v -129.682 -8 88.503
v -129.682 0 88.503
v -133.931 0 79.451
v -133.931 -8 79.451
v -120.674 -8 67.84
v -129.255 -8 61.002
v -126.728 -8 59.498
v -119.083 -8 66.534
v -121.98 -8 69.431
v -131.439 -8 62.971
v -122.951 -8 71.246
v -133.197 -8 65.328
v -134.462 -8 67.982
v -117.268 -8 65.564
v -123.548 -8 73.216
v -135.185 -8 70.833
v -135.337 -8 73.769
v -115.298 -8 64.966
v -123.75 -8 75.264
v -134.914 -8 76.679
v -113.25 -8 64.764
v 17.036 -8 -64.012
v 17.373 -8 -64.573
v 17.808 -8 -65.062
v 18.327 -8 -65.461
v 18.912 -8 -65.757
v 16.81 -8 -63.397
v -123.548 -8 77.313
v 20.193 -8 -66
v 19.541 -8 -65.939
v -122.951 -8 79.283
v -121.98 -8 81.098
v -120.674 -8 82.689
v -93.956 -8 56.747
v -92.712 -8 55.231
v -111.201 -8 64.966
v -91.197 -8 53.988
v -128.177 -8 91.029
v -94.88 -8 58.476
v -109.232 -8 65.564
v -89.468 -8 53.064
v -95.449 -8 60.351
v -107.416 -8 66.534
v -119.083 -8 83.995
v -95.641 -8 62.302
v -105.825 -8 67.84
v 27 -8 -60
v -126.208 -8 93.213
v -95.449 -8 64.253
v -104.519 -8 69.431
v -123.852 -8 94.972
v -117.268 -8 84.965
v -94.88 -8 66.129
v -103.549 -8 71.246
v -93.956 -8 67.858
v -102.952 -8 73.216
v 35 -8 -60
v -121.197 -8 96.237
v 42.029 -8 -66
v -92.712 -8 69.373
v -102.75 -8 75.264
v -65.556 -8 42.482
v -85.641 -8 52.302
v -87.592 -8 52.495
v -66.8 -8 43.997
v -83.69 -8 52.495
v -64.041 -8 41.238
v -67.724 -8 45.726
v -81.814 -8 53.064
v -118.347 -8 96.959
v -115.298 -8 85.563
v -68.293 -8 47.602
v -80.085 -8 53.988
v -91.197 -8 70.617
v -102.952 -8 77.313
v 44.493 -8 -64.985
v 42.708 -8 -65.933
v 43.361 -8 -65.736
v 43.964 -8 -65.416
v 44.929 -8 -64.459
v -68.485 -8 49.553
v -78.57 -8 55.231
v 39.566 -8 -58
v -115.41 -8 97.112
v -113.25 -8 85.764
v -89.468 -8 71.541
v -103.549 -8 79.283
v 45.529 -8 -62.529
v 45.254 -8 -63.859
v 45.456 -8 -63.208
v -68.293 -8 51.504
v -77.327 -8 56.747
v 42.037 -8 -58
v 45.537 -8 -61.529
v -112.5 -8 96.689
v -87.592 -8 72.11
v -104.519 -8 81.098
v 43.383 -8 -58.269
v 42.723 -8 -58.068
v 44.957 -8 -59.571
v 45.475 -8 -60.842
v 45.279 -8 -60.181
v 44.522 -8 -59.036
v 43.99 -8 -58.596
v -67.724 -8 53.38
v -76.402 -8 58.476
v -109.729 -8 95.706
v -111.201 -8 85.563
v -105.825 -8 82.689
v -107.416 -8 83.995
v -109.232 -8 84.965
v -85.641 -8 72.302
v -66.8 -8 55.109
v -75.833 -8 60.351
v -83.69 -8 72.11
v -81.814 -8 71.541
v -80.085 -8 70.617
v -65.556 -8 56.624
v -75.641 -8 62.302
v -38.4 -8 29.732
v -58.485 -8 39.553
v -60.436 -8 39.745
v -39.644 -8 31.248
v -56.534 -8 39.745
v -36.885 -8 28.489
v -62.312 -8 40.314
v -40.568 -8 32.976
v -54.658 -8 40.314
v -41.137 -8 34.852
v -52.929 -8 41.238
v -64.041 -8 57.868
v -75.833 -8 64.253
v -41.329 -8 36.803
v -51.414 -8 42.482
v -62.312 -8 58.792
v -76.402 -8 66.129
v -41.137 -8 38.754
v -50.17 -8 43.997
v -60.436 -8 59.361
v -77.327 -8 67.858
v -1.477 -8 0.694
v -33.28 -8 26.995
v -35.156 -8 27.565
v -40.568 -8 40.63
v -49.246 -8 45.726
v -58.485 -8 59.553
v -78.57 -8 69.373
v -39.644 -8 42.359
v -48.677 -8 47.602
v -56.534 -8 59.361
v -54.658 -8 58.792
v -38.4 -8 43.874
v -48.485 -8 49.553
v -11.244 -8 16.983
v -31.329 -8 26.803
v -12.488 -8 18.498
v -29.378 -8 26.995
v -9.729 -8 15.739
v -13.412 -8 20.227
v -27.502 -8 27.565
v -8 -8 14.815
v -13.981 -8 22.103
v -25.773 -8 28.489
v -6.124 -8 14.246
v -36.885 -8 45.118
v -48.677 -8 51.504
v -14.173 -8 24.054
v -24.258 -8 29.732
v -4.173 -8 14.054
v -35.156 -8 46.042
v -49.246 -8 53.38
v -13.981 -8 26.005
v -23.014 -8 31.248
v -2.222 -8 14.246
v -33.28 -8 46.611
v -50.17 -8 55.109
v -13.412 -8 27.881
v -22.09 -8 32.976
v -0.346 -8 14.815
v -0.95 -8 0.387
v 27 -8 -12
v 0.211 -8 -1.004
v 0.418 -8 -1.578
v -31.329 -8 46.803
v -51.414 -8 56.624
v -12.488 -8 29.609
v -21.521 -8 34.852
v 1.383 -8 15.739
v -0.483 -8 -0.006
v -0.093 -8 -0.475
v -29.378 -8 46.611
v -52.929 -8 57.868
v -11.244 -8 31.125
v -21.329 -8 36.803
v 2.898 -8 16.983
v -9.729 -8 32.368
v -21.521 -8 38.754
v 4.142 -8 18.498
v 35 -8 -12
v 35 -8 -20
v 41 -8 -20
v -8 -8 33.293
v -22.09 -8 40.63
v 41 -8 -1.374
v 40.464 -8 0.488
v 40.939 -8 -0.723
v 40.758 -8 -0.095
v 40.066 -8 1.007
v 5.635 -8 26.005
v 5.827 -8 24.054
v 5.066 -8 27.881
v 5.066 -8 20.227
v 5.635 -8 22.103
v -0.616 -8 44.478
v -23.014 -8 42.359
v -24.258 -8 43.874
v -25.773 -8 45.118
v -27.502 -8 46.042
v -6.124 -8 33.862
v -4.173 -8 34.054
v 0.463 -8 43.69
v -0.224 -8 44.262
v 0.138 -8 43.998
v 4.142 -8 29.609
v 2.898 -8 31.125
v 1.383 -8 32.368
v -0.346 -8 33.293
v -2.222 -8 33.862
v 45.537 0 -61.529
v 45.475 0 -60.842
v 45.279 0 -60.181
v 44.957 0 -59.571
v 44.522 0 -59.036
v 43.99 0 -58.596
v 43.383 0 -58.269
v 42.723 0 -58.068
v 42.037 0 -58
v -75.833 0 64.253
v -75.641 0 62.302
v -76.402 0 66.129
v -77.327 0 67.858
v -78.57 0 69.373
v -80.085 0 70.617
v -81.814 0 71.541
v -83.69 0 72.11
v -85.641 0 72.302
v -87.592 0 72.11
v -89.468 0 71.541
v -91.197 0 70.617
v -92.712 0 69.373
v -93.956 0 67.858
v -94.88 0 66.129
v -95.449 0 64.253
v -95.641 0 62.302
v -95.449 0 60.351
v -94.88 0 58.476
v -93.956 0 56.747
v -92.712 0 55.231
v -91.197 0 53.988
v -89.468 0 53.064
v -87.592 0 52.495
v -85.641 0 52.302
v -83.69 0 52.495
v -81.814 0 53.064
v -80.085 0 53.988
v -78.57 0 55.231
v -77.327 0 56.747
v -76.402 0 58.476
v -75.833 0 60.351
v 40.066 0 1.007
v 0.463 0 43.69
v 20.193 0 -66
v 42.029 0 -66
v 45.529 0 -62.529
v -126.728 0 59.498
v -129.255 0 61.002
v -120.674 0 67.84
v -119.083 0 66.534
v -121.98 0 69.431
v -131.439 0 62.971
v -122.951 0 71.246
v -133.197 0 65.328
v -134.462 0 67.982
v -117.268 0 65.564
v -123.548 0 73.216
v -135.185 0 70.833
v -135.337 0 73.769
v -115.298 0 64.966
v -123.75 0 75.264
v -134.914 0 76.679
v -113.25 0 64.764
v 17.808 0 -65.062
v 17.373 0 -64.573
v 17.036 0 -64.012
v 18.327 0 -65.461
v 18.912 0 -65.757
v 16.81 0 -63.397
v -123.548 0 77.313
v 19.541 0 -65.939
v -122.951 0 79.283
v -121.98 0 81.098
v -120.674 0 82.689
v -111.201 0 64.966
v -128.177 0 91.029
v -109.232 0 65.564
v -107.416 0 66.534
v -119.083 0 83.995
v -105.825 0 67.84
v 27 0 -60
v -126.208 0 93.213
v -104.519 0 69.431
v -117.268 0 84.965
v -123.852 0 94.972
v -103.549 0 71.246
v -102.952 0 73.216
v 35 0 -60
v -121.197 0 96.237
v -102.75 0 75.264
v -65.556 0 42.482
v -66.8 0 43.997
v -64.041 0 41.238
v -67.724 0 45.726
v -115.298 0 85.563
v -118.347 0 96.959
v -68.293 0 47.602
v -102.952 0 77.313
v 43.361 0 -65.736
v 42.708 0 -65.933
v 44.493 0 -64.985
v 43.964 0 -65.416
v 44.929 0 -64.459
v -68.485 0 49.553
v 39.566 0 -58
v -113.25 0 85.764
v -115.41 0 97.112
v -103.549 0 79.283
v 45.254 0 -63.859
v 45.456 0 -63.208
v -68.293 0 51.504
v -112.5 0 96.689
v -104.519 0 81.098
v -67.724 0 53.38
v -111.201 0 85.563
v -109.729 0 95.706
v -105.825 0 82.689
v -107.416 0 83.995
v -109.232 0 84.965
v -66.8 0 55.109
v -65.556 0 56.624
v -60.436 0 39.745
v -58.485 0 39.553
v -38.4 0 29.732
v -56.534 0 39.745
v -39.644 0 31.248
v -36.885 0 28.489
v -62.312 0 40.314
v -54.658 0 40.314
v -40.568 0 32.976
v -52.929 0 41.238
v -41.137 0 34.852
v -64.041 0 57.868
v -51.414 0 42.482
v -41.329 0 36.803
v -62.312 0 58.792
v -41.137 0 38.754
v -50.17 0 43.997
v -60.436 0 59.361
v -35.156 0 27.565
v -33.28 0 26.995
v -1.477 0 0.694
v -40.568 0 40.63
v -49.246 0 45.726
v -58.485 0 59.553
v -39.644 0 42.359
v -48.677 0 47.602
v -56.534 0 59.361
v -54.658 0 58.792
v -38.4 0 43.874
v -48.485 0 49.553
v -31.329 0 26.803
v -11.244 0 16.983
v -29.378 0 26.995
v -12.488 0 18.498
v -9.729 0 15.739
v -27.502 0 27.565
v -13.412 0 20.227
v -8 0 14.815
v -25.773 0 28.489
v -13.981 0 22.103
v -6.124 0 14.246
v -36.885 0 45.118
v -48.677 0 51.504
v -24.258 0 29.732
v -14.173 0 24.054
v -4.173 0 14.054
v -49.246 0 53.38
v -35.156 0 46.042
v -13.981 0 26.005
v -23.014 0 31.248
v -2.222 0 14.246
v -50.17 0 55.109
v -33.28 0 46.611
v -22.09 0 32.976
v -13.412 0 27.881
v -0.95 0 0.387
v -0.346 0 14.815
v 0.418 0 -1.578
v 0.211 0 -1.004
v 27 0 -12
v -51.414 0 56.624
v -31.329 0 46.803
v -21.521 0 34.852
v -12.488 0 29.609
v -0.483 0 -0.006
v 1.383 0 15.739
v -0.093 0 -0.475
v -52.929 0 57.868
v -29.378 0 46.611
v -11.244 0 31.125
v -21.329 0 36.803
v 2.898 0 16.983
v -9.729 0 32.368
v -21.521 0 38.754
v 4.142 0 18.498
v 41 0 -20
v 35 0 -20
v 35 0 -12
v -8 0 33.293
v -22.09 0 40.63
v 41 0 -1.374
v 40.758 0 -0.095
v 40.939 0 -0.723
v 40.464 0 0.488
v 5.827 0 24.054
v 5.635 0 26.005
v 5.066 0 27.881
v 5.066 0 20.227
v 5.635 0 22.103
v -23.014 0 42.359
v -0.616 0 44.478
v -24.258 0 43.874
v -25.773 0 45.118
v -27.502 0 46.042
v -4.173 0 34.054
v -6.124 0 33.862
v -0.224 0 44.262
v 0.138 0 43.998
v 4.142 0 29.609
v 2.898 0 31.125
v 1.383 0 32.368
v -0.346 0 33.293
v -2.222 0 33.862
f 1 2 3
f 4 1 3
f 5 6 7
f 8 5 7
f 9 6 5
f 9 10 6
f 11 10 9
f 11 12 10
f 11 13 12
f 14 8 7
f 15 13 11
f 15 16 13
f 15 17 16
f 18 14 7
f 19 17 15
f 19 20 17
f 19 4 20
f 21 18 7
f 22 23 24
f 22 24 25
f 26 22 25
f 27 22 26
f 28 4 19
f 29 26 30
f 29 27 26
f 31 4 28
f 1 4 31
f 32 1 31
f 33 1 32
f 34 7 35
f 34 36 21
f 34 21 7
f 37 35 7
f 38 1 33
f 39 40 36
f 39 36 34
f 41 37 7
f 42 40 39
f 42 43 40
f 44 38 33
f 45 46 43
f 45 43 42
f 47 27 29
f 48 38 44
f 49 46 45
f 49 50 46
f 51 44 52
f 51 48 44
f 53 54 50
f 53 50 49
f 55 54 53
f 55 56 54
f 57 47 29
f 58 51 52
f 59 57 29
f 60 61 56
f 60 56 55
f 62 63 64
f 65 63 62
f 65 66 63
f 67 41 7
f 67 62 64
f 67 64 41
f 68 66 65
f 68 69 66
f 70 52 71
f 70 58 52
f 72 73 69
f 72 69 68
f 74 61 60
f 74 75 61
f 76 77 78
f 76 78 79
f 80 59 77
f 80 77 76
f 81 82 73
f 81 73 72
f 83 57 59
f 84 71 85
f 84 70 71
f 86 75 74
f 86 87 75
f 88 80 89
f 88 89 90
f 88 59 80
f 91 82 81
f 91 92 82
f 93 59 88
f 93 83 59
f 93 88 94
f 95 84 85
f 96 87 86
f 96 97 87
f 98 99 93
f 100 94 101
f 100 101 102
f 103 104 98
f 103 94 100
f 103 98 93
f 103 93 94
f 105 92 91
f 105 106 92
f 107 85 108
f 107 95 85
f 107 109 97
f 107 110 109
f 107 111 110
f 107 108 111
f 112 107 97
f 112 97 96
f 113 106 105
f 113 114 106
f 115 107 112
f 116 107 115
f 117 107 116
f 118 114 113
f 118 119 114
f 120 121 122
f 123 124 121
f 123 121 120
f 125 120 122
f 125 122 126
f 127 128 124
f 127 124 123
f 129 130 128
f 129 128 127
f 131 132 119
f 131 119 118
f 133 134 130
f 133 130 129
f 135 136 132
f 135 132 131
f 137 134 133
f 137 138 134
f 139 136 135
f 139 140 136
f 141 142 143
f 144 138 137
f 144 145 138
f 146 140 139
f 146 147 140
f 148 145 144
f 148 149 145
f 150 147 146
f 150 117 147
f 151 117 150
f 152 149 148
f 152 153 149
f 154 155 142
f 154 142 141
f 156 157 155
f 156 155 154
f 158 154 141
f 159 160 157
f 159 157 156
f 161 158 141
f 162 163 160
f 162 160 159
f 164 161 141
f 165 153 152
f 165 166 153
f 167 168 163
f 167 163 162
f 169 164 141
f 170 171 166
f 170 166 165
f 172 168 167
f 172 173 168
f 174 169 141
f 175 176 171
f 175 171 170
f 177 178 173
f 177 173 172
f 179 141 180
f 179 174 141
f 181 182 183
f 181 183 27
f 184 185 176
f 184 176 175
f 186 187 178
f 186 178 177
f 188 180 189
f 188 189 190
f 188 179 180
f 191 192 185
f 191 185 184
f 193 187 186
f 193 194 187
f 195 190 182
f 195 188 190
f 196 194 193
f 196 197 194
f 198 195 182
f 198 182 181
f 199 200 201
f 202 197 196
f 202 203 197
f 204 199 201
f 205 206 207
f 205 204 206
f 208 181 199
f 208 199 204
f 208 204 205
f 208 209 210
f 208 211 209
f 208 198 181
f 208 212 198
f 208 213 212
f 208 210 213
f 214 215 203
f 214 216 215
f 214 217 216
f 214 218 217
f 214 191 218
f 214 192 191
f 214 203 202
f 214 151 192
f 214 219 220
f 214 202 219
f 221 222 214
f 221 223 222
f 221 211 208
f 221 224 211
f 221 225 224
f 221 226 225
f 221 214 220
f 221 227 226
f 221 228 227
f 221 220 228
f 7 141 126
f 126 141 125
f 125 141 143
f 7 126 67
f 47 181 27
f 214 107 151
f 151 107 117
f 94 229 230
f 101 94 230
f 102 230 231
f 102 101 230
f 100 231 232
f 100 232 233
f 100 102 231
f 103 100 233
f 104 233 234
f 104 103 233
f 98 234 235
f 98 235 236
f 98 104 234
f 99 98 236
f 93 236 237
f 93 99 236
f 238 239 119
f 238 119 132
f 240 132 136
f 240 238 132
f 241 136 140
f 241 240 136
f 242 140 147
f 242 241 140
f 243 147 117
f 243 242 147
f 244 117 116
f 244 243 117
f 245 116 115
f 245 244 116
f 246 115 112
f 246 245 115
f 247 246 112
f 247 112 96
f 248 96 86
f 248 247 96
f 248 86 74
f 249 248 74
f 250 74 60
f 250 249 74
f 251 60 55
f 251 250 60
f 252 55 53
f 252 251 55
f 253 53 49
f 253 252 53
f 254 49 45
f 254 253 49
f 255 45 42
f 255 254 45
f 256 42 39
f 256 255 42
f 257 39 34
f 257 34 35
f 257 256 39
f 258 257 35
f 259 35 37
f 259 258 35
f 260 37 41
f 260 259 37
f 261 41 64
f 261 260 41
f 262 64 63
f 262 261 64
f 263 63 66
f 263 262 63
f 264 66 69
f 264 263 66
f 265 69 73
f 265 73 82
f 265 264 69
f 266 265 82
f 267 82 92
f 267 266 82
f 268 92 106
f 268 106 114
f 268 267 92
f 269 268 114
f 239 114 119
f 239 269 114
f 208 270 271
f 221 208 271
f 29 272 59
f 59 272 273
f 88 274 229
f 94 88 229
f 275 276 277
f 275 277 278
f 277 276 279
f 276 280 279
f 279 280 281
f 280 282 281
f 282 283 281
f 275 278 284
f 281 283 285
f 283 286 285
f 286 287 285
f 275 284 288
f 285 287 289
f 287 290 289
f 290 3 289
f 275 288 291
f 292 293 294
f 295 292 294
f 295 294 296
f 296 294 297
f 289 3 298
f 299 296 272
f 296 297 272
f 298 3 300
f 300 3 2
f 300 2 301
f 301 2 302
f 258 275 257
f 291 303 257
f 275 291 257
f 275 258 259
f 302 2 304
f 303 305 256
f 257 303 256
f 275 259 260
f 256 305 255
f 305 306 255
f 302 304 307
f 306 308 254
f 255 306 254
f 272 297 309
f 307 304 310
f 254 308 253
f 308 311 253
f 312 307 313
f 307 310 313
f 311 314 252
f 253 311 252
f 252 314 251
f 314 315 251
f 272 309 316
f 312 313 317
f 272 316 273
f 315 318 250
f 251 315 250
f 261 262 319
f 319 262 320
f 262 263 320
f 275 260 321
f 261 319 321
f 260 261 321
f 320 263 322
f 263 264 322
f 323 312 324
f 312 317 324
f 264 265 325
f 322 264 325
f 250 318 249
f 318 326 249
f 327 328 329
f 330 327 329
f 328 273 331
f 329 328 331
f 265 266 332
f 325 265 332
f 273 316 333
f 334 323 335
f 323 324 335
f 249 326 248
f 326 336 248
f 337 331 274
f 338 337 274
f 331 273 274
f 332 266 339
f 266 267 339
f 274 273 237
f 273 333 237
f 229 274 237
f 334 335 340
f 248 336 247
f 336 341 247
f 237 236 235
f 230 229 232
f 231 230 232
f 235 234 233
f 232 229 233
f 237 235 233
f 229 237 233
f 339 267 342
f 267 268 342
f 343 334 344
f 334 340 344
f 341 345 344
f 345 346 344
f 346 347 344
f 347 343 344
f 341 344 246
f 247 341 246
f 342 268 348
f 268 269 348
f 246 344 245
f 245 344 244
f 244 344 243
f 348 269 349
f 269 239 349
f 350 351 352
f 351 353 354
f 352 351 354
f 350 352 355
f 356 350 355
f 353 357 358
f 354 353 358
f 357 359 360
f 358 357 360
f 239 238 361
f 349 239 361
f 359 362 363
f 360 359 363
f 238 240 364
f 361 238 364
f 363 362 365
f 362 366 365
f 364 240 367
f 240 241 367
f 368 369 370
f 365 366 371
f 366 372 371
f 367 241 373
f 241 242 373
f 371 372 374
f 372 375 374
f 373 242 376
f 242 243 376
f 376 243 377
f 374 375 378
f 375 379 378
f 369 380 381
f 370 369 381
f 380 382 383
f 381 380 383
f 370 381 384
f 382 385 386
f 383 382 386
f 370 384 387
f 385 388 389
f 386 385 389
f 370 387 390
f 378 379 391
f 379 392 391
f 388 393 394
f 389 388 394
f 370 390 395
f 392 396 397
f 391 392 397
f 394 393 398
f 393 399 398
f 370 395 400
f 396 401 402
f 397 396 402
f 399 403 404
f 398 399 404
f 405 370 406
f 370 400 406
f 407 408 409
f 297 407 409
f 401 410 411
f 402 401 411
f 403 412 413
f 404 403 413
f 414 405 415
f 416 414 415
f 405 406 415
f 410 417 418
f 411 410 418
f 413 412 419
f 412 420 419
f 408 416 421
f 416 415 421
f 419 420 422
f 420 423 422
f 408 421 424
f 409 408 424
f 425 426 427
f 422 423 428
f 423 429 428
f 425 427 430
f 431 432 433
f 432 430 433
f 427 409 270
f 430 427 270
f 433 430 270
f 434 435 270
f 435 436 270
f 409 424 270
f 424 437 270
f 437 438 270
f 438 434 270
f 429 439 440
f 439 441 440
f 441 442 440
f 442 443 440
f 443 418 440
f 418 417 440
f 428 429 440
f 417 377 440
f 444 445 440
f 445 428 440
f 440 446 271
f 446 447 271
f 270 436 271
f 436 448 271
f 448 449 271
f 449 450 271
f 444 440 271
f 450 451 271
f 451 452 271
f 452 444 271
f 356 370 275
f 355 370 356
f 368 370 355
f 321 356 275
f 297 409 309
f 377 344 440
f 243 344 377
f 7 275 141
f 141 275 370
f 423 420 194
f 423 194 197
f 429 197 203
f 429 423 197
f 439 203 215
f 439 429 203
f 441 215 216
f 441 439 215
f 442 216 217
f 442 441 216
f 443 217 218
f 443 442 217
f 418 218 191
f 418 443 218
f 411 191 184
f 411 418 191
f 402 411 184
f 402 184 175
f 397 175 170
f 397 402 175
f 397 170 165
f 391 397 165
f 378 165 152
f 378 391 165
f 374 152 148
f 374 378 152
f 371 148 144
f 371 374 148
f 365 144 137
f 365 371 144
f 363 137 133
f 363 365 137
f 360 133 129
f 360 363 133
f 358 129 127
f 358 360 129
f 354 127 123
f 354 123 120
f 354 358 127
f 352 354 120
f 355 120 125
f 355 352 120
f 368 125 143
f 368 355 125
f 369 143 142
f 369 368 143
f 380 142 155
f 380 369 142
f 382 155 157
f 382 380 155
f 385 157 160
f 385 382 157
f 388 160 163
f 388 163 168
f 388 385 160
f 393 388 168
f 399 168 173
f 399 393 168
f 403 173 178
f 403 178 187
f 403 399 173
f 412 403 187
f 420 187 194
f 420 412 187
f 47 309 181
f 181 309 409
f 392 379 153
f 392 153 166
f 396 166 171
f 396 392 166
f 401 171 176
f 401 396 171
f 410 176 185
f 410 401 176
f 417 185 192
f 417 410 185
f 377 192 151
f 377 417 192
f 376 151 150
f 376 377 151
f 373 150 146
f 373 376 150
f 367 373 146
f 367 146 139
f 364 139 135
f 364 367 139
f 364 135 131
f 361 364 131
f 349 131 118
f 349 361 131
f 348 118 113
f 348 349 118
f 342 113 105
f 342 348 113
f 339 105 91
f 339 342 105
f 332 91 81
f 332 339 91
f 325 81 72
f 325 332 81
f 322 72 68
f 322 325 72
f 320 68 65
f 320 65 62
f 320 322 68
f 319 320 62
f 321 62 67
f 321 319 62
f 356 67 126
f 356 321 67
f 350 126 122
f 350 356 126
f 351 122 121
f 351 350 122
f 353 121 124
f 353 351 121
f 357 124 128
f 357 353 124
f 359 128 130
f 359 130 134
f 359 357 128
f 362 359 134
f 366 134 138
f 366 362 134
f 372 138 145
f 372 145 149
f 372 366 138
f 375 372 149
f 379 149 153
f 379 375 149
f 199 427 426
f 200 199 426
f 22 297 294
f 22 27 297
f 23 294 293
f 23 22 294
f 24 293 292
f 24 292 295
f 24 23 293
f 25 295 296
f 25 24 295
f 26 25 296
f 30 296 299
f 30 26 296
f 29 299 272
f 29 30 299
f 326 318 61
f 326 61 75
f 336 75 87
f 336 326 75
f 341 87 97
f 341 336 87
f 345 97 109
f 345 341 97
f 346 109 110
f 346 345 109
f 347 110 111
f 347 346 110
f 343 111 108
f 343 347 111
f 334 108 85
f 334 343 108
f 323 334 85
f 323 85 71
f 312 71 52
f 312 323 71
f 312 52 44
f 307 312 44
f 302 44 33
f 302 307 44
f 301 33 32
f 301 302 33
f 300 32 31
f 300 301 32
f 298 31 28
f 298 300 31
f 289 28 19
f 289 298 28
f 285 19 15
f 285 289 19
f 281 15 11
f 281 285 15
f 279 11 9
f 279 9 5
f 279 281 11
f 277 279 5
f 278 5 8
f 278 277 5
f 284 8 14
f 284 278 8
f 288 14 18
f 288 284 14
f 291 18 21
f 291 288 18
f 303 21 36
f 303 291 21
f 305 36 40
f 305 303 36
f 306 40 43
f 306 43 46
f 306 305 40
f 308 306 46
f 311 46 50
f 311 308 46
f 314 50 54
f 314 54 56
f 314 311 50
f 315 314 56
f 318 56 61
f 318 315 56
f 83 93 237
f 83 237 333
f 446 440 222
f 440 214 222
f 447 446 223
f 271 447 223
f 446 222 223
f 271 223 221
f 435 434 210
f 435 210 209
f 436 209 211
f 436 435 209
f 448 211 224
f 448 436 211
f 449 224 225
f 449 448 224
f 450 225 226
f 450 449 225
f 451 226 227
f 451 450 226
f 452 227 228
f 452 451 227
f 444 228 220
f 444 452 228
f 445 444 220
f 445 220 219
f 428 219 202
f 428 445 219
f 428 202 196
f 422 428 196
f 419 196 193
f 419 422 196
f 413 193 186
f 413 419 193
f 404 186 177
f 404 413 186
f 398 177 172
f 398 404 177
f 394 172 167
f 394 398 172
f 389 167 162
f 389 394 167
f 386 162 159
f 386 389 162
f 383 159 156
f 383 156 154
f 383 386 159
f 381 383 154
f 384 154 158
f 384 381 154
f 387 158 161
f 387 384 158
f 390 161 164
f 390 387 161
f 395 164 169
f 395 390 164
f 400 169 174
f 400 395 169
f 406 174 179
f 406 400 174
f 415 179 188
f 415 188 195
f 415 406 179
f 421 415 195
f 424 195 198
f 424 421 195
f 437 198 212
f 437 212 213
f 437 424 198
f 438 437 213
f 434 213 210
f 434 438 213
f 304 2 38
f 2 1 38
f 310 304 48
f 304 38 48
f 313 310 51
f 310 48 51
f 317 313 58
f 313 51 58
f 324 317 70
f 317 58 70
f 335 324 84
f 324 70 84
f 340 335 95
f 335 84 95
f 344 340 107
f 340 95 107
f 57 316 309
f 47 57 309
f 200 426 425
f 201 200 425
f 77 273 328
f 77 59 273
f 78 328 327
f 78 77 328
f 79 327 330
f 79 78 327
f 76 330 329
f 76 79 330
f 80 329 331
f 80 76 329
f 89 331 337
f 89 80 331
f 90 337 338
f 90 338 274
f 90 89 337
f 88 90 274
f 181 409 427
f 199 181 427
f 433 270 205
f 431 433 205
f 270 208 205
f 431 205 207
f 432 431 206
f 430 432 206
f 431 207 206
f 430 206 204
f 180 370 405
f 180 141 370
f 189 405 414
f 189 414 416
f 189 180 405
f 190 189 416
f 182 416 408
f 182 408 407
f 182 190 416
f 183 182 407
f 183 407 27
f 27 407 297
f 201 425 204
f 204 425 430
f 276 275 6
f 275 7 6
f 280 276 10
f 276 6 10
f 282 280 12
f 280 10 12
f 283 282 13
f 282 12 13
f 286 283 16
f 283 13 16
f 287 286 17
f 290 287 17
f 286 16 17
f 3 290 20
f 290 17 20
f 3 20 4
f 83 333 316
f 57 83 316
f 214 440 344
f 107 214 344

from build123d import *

# Parameters (mm, degrees)
F0_R     = 10
F0_R_2   = 10.5
F1_DEPTH = 8
F2_R     = 15
F3_R     = 3.5


with BuildPart() as f1:
    # F0 (on Front) → F1 (new body)
    with BuildSketch(Plane.XZ):
        Polygon((-140.306121, 65.872547), (0, 0), (17.5, -66), (45.5, -66), (45.56593, -58.000272), (39.56593, -58.000272), (35, -60), (27, -60), (27, -12), (35, -12), (35, -20), (41, -20), (41, 0), (0, 44.189091), (-123.306754, 102.080578), align=None)
        with Locations((-58.485174, 49.552844)):
            Circle(F0_R, mode=Mode.SUBTRACT)
        with Locations((-113.249821, 75.264387)):
            Circle(F0_R_2, mode=Mode.SUBTRACT)
        with Locations((-85.641198, 62.30237)):
            Circle(F0_R, mode=Mode.SUBTRACT)
        with Locations((-31.329151, 36.803319)):
            Circle(F0_R, mode=Mode.SUBTRACT)
        with Locations((-4.173127, 24.053794)):
            Circle(F0_R, mode=Mode.SUBTRACT)
    extrude(amount=F1_DEPTH)

    # F2
    f2_edges = [f1.edges().sort_by_distance(p)[0] for p in [
        (-123.306754, -4, 102.080578),
        (-140.306121, -4, 65.872547),
    ]]
    fillet(f2_edges, radius=F2_R)

    # F3
    f3_edges = [f1.edges().sort_by_distance(p)[0] for p in [
        (0, -4, 0),
        (41, -4, 0),
        (0, -4, 44.189091),
        (45.56593, -4, -58.000272),
        (45.5, -4, -66),
        (17.5, -4, -66),
    ]]
    fillet(f3_edges, radius=F3_R)


solid = f1.part
